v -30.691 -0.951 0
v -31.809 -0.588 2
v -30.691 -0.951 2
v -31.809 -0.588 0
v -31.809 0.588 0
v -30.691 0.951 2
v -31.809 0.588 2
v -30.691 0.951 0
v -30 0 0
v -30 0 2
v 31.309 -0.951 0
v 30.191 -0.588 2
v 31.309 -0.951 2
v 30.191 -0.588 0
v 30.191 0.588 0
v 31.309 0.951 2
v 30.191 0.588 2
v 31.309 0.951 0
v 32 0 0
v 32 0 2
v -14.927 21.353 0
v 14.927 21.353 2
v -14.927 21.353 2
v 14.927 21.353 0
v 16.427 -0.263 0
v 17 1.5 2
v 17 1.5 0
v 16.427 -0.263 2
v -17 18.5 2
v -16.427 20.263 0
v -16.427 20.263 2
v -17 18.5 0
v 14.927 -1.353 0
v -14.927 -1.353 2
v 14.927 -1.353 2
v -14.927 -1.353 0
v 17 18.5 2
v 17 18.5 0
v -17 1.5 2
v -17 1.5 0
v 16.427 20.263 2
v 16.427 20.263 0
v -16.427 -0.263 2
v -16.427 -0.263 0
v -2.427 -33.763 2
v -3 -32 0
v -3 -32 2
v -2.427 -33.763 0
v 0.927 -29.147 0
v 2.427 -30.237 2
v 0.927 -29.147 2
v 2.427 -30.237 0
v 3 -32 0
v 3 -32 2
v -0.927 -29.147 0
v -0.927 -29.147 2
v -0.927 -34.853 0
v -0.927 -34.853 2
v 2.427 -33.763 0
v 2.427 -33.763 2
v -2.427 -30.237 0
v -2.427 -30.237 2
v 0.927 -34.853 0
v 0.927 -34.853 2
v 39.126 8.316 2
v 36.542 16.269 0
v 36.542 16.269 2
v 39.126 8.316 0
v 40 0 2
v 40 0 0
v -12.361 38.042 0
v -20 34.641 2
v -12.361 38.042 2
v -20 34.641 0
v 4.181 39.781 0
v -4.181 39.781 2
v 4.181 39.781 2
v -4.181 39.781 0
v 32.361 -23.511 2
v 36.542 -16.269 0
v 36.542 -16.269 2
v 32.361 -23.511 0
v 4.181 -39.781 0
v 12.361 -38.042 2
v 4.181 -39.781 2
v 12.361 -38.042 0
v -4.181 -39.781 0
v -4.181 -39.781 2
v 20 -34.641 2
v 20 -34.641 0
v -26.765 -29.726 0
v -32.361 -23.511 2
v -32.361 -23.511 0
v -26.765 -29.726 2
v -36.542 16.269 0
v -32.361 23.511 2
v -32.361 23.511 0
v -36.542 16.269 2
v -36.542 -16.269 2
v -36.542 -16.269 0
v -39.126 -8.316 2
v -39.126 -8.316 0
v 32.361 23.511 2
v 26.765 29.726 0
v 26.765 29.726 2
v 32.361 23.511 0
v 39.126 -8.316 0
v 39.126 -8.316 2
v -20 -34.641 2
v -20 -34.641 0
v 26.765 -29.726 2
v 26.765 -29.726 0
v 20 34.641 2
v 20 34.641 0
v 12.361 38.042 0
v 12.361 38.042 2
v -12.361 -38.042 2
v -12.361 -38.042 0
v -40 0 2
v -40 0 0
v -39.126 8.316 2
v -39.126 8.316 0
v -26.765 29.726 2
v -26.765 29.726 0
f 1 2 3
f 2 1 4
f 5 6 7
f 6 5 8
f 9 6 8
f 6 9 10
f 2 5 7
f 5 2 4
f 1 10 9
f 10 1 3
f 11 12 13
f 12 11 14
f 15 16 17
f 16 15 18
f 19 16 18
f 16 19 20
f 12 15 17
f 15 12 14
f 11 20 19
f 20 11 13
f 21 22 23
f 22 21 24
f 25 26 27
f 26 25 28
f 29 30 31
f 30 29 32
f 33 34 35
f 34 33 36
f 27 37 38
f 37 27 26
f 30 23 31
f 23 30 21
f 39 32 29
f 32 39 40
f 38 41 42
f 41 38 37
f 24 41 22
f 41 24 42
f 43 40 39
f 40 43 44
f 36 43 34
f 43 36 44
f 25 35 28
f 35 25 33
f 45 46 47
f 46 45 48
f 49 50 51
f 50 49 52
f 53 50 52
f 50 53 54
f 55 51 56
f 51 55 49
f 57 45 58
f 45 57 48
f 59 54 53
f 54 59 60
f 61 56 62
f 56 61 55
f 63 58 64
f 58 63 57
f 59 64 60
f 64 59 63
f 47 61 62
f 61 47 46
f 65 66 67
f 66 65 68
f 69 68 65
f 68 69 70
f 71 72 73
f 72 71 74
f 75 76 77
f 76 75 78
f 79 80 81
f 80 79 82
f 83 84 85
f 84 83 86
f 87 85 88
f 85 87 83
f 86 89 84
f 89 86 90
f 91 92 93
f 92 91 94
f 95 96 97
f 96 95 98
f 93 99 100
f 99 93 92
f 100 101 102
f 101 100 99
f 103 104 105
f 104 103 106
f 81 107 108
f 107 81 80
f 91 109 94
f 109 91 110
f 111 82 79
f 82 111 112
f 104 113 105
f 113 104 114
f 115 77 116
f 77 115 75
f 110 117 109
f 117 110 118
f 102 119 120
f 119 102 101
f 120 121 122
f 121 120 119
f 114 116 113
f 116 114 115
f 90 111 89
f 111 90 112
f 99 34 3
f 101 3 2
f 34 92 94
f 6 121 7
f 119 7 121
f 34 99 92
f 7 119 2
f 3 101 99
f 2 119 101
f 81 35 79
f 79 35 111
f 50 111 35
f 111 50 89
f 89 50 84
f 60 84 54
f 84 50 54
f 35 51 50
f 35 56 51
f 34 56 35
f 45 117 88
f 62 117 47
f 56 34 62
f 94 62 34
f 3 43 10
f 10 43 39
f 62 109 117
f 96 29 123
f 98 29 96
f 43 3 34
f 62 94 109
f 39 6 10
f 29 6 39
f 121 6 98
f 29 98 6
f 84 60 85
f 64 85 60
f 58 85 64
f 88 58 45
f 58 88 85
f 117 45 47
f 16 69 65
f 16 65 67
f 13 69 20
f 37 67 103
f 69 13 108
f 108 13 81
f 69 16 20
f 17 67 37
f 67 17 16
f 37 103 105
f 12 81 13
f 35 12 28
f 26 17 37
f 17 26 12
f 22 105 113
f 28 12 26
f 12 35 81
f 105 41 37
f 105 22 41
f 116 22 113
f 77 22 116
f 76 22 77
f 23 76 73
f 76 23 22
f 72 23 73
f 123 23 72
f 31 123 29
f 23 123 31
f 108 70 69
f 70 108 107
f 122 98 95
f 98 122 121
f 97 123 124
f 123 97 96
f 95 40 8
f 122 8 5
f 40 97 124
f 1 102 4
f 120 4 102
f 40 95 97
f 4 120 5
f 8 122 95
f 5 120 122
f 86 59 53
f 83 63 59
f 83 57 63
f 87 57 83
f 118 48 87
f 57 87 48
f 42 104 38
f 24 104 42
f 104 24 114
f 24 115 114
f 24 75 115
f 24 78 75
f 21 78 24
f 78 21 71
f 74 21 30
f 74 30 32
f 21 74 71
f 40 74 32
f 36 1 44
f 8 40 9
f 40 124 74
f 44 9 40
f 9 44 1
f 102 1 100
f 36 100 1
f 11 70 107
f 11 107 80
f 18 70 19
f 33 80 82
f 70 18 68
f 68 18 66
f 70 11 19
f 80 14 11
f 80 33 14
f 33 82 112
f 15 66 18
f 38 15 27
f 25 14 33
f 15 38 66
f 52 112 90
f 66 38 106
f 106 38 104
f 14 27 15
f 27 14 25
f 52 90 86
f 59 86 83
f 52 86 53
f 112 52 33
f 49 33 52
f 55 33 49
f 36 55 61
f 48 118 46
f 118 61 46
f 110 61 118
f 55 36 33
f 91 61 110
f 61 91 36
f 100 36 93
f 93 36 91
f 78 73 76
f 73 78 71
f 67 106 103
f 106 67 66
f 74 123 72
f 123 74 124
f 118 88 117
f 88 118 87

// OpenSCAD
// file: display.scad
module nokia_hole() {
    cylinder(6, 1.5, 1.5, center=false);
} 

module nokia_holes() {
    union() {
        translate([-44.5 / 2.0, -37.5 / 2.0, -2]) nokia_hole();
        translate([-44.5 / 2.0, 37.5 / 2.0, -2]) nokia_hole();
        translate([44.5 / 2.0, -37.5 / 2.0, -2]) nokia_hole();
        translate([44.5 / 2.0, 37.5 / 2.0, -2]) nokia_hole();
    }
}

module nokia_pcb() {
    color("Lime")
        linear_extrude(1, center=false)
            square([50, 42], center=true);
}
    
module nokia_board() {
    difference() {
        nokia_pcb();
        nokia_holes();
    }
}

module nokia_lcd_case() {
    color("LightCyan")
        linear_extrude(4, center=false)
            square([40, 34], center=true);
}

module nokia_lcd_inset() {
    linear_extrude(2, center=false)
        square([36, 25.5], center=true);
}

module nokia_display() {
    nokia_board();
    difference() {
        translate([0, 0, 1]) nokia_lcd_case();
        translate([0, -3, 4.5]) nokia_lcd_inset();
    }
}

nokia_display();
// file: faceplate.scad
include <speedo_config.scad>

module faceplate_cutout() {
    minkowski() {
        linear_extrude(4, center=false)
            square([faceplate_display_width-6, faceplate_display_height-6], center=true);
        cylinder(r=3, h=4);
    }
}

module faceplate_highbeam() {
    translate([0, -32, -1])
        cylinder(4, 3, 3, center=false);
}

module faceplate_hole() {
    cylinder(4, faceplate_attach_hole_r, faceplate_attach_hole_r, center=false);
}

module faceplate_holes() {
    union() {
        translate([-faceplate_attach_hole_span/2, 0, -1])
            faceplate_hole();
        translate([faceplate_attach_hole_span/2, 0, -1])
            faceplate_hole();
    }
}

module faceplate() {
    color("Black")
        difference() {
            linear_extrude(faceplate_thickness, center=false)
                circle(d=80);
            union() {
                translate([0, 10, -1])
                    faceplate_cutout();
                faceplate_highbeam();
                faceplate_holes();
            }
        }
}

faceplate();
// file: bracket.scad
include <speedo_config.scad>

module sideplate() {
    linear_extrude(25, center=false)
        polygon(points=[
		[-16,0],
    		[15,0],
    		[25,(bracket_display_width-bracket_inner_width)/2+bracket_thickness],
    		[bracket_faceplate_height,(bracket_display_width-bracket_inner_width)/2+bracket_thickness],
    		[bracket_faceplate_height,(bracket_display_width-bracket_inner_width)/2+2*bracket_thickness],
    		[25-1,(bracket_display_width-bracket_inner_width)/2+2*bracket_thickness],
    		[15-1,bracket_thickness],
    		[-16,bracket_thickness]]);
}
    
module sideplate_trim() {
    linear_extrude(bracket_display_width, center=false)
        polygon(points=[[-16,0],[-8,15],[-16,15]]);
}

module sideplates() {
    difference() {
        union() {
            translate([0, bracket_inner_width/2-bracket_thickness, 0])
                sideplate();
            translate([0,-bracket_inner_width/2+bracket_thickness, 25])
                rotate(a=[180,0,0])
                    sideplate();
        }
        translate([0,bracket_display_width/2,10])
            rotate(a=[90,0,0])
                sideplate_trim();
    }
}

module reinforcement() {
    linear_extrude(bracket_thickness, center=false)
        polygon(points=[
            [-5,0],
    		[15,0],
    		[25,(bracket_display_width-bracket_inner_width)/2+bracket_thickness],
    		[bracket_display_plate_height-bracket_thickness,(bracket_display_width-bracket_inner_width)/2+bracket_thickness],
    		[bracket_display_plate_height-bracket_thickness,-3],
    		[25-1,-3],
    		[15-1,-3],
            [0,-3],
    		[-5,0]]);
}

module endplate() {
    linear_extrude(bracket_thickness, center=false)
        square([10,bracket_inner_width],center=false);
}

module reinforcements() {
    union() {
        translate([0, bracket_inner_width/2-bracket_thickness, 0])
            reinforcement();
        translate([0,-bracket_inner_width/2+bracket_thickness, bracket_thickness])
            rotate(a=[180,0,0])
                reinforcement();
    }
}

module display_post() {
    union() {
        cylinder(2, 2, 2, center=false);
        translate([0, 0, 2])
            cylinder(1, 1.5, 1.5, center=false);
    }
}

module display_posts() {
    union() {
        translate([-44.5 / 2.0, -37.5 / 2.0, 0]) display_post();
        translate([-44.5 / 2.0, 37.5 / 2.0, 0]) display_post();
        translate([44.5 / 2.0, -37.5 / 2.0, 0]) display_post();
        translate([44.5 / 2.0, 37.5 / 2.0, 0]) display_post();
    }
}

module display_hole() {
    cylinder(4, faceplate_attach_hole_r, faceplate_attach_hole_r, center=false);
}

module display_holes() {
    union() {
        translate([-faceplate_attach_hole_span/2, 0, -1])
            display_hole();
        translate([faceplate_attach_hole_span/2, 0, -1])
            display_hole();
    }
}

module faceplate_cutout() {
    minkowski() {
        linear_extrude(6, center=true)
            square([25, 25], center=true);
        cylinder(r=2,h=6);
    }
}

module plate_radius() {
    difference() {
        translate([8,8,0])
            linear_extrude(6, center=false)
                square(16, center=true);
        cylinder(r=8,h=6);
    }
}

module plate() {
    difference() {
        linear_extrude(bracket_thickness, center=false)
            square([48, bracket_display_width], center=true);
        translate([48/2-8, bracket_display_width/2-8, -2])
            plate_radius();
        translate([48/2-8, -bracket_display_width/2+8, -2])
            rotate(a=[0,0,-90])
                plate_radius();
    }
}

module displayplate() {
    difference() {
        union() {
            plate();
            translate([1.5, 0, 2])
                rotate(a=[0, 0, 90])
                    display_posts();
        }
        translate([-20,0,0])
            faceplate_cutout();
    }
}

module display_ear() {
    linear_extrude(bracket_thickness, center=false)
        polygon(points=[[-12,0],[10,0],[5,5],[-12,5]]);
}

module display_ears() {
    difference() {
        union() {
            translate([0, bracket_display_width/2+bracket_thickness, 0]) 
                display_ear();
            translate([0, -bracket_display_width/2-bracket_thickness, bracket_thickness])
                rotate(a=[180,0,0])
                    display_ear();
        }
        rotate(a=[0, 0, 90])
            display_holes();
    }
}

module pcb_ear() {
    linear_extrude(bracket_thickness, center=false)
        polygon(points=[[-5,0],[10,0],[10,5],[0,5]]);
}

module pcb_ears() {
    translate([0, bracket_display_width/2+bracket_thickness, 0]) 
           pcb_ear();
    translate([0, -bracket_display_width/2-bracket_thickness, bracket_thickness])
        rotate(a=[180,0,0])
            pcb_ear();
}

module bracket() {
    union() {
        translate([25/2,0,0])
            rotate(a=[0,-90,0])
                sideplates();
        translate([11.5, 0, 42-5-bracket_thickness-2])
            displayplate();
        translate([-25/2+bracket_thickness, 0, bracket_faceplate_height-10]) 
            rotate(a=[0,-90,0])
                pcb_ears();
        translate([0, 0, bracket_faceplate_height-bracket_thickness])
            display_ears();
        translate([12.5,0,0])
            rotate(a=[0,-90,0])
                reinforcements();
        translate([2.5,-bracket_inner_width/2,-16])
            rotate(a=[0,0,0])
                endplate();
    }
}

bracket();
// file: speedo_config.scad
faceplate_display_width = 34;
faceplate_display_height = 23;
faceplate_thickness = 2;

faceplate_attach_hole_r = 1;
faceplate_attach_hole_span = 62;

bracket_thickness = 2;
bracket_display_width = 52;
bracket_faceplate_height = 42;
bracket_display_plate_height = 42 - 5 - 2;
bracket_inner_width = 46;
// main file
include <speedo_config.scad>
use <bracket.scad>
use <faceplate.scad>
use <display.scad>

module assembly() {
    bracket();
    translate([13, 0, bracket_faceplate_height-5])
        rotate([0,0,-90])
            nokia_display();
    translate([0, 0, bracket_faceplate_height])
        rotate([0,0,-90])
            faceplate();
}

mod = "faceplate";

if (mod == "display")
    nokia_display();
else if (mod == "faceplate") 
    faceplate();
else if (mod == "bracket") 
    translate([0, 0, 12.5])
        rotate([0,-90, 0]) 
            bracket();
else if (mod == "assembly")
    assembly();
